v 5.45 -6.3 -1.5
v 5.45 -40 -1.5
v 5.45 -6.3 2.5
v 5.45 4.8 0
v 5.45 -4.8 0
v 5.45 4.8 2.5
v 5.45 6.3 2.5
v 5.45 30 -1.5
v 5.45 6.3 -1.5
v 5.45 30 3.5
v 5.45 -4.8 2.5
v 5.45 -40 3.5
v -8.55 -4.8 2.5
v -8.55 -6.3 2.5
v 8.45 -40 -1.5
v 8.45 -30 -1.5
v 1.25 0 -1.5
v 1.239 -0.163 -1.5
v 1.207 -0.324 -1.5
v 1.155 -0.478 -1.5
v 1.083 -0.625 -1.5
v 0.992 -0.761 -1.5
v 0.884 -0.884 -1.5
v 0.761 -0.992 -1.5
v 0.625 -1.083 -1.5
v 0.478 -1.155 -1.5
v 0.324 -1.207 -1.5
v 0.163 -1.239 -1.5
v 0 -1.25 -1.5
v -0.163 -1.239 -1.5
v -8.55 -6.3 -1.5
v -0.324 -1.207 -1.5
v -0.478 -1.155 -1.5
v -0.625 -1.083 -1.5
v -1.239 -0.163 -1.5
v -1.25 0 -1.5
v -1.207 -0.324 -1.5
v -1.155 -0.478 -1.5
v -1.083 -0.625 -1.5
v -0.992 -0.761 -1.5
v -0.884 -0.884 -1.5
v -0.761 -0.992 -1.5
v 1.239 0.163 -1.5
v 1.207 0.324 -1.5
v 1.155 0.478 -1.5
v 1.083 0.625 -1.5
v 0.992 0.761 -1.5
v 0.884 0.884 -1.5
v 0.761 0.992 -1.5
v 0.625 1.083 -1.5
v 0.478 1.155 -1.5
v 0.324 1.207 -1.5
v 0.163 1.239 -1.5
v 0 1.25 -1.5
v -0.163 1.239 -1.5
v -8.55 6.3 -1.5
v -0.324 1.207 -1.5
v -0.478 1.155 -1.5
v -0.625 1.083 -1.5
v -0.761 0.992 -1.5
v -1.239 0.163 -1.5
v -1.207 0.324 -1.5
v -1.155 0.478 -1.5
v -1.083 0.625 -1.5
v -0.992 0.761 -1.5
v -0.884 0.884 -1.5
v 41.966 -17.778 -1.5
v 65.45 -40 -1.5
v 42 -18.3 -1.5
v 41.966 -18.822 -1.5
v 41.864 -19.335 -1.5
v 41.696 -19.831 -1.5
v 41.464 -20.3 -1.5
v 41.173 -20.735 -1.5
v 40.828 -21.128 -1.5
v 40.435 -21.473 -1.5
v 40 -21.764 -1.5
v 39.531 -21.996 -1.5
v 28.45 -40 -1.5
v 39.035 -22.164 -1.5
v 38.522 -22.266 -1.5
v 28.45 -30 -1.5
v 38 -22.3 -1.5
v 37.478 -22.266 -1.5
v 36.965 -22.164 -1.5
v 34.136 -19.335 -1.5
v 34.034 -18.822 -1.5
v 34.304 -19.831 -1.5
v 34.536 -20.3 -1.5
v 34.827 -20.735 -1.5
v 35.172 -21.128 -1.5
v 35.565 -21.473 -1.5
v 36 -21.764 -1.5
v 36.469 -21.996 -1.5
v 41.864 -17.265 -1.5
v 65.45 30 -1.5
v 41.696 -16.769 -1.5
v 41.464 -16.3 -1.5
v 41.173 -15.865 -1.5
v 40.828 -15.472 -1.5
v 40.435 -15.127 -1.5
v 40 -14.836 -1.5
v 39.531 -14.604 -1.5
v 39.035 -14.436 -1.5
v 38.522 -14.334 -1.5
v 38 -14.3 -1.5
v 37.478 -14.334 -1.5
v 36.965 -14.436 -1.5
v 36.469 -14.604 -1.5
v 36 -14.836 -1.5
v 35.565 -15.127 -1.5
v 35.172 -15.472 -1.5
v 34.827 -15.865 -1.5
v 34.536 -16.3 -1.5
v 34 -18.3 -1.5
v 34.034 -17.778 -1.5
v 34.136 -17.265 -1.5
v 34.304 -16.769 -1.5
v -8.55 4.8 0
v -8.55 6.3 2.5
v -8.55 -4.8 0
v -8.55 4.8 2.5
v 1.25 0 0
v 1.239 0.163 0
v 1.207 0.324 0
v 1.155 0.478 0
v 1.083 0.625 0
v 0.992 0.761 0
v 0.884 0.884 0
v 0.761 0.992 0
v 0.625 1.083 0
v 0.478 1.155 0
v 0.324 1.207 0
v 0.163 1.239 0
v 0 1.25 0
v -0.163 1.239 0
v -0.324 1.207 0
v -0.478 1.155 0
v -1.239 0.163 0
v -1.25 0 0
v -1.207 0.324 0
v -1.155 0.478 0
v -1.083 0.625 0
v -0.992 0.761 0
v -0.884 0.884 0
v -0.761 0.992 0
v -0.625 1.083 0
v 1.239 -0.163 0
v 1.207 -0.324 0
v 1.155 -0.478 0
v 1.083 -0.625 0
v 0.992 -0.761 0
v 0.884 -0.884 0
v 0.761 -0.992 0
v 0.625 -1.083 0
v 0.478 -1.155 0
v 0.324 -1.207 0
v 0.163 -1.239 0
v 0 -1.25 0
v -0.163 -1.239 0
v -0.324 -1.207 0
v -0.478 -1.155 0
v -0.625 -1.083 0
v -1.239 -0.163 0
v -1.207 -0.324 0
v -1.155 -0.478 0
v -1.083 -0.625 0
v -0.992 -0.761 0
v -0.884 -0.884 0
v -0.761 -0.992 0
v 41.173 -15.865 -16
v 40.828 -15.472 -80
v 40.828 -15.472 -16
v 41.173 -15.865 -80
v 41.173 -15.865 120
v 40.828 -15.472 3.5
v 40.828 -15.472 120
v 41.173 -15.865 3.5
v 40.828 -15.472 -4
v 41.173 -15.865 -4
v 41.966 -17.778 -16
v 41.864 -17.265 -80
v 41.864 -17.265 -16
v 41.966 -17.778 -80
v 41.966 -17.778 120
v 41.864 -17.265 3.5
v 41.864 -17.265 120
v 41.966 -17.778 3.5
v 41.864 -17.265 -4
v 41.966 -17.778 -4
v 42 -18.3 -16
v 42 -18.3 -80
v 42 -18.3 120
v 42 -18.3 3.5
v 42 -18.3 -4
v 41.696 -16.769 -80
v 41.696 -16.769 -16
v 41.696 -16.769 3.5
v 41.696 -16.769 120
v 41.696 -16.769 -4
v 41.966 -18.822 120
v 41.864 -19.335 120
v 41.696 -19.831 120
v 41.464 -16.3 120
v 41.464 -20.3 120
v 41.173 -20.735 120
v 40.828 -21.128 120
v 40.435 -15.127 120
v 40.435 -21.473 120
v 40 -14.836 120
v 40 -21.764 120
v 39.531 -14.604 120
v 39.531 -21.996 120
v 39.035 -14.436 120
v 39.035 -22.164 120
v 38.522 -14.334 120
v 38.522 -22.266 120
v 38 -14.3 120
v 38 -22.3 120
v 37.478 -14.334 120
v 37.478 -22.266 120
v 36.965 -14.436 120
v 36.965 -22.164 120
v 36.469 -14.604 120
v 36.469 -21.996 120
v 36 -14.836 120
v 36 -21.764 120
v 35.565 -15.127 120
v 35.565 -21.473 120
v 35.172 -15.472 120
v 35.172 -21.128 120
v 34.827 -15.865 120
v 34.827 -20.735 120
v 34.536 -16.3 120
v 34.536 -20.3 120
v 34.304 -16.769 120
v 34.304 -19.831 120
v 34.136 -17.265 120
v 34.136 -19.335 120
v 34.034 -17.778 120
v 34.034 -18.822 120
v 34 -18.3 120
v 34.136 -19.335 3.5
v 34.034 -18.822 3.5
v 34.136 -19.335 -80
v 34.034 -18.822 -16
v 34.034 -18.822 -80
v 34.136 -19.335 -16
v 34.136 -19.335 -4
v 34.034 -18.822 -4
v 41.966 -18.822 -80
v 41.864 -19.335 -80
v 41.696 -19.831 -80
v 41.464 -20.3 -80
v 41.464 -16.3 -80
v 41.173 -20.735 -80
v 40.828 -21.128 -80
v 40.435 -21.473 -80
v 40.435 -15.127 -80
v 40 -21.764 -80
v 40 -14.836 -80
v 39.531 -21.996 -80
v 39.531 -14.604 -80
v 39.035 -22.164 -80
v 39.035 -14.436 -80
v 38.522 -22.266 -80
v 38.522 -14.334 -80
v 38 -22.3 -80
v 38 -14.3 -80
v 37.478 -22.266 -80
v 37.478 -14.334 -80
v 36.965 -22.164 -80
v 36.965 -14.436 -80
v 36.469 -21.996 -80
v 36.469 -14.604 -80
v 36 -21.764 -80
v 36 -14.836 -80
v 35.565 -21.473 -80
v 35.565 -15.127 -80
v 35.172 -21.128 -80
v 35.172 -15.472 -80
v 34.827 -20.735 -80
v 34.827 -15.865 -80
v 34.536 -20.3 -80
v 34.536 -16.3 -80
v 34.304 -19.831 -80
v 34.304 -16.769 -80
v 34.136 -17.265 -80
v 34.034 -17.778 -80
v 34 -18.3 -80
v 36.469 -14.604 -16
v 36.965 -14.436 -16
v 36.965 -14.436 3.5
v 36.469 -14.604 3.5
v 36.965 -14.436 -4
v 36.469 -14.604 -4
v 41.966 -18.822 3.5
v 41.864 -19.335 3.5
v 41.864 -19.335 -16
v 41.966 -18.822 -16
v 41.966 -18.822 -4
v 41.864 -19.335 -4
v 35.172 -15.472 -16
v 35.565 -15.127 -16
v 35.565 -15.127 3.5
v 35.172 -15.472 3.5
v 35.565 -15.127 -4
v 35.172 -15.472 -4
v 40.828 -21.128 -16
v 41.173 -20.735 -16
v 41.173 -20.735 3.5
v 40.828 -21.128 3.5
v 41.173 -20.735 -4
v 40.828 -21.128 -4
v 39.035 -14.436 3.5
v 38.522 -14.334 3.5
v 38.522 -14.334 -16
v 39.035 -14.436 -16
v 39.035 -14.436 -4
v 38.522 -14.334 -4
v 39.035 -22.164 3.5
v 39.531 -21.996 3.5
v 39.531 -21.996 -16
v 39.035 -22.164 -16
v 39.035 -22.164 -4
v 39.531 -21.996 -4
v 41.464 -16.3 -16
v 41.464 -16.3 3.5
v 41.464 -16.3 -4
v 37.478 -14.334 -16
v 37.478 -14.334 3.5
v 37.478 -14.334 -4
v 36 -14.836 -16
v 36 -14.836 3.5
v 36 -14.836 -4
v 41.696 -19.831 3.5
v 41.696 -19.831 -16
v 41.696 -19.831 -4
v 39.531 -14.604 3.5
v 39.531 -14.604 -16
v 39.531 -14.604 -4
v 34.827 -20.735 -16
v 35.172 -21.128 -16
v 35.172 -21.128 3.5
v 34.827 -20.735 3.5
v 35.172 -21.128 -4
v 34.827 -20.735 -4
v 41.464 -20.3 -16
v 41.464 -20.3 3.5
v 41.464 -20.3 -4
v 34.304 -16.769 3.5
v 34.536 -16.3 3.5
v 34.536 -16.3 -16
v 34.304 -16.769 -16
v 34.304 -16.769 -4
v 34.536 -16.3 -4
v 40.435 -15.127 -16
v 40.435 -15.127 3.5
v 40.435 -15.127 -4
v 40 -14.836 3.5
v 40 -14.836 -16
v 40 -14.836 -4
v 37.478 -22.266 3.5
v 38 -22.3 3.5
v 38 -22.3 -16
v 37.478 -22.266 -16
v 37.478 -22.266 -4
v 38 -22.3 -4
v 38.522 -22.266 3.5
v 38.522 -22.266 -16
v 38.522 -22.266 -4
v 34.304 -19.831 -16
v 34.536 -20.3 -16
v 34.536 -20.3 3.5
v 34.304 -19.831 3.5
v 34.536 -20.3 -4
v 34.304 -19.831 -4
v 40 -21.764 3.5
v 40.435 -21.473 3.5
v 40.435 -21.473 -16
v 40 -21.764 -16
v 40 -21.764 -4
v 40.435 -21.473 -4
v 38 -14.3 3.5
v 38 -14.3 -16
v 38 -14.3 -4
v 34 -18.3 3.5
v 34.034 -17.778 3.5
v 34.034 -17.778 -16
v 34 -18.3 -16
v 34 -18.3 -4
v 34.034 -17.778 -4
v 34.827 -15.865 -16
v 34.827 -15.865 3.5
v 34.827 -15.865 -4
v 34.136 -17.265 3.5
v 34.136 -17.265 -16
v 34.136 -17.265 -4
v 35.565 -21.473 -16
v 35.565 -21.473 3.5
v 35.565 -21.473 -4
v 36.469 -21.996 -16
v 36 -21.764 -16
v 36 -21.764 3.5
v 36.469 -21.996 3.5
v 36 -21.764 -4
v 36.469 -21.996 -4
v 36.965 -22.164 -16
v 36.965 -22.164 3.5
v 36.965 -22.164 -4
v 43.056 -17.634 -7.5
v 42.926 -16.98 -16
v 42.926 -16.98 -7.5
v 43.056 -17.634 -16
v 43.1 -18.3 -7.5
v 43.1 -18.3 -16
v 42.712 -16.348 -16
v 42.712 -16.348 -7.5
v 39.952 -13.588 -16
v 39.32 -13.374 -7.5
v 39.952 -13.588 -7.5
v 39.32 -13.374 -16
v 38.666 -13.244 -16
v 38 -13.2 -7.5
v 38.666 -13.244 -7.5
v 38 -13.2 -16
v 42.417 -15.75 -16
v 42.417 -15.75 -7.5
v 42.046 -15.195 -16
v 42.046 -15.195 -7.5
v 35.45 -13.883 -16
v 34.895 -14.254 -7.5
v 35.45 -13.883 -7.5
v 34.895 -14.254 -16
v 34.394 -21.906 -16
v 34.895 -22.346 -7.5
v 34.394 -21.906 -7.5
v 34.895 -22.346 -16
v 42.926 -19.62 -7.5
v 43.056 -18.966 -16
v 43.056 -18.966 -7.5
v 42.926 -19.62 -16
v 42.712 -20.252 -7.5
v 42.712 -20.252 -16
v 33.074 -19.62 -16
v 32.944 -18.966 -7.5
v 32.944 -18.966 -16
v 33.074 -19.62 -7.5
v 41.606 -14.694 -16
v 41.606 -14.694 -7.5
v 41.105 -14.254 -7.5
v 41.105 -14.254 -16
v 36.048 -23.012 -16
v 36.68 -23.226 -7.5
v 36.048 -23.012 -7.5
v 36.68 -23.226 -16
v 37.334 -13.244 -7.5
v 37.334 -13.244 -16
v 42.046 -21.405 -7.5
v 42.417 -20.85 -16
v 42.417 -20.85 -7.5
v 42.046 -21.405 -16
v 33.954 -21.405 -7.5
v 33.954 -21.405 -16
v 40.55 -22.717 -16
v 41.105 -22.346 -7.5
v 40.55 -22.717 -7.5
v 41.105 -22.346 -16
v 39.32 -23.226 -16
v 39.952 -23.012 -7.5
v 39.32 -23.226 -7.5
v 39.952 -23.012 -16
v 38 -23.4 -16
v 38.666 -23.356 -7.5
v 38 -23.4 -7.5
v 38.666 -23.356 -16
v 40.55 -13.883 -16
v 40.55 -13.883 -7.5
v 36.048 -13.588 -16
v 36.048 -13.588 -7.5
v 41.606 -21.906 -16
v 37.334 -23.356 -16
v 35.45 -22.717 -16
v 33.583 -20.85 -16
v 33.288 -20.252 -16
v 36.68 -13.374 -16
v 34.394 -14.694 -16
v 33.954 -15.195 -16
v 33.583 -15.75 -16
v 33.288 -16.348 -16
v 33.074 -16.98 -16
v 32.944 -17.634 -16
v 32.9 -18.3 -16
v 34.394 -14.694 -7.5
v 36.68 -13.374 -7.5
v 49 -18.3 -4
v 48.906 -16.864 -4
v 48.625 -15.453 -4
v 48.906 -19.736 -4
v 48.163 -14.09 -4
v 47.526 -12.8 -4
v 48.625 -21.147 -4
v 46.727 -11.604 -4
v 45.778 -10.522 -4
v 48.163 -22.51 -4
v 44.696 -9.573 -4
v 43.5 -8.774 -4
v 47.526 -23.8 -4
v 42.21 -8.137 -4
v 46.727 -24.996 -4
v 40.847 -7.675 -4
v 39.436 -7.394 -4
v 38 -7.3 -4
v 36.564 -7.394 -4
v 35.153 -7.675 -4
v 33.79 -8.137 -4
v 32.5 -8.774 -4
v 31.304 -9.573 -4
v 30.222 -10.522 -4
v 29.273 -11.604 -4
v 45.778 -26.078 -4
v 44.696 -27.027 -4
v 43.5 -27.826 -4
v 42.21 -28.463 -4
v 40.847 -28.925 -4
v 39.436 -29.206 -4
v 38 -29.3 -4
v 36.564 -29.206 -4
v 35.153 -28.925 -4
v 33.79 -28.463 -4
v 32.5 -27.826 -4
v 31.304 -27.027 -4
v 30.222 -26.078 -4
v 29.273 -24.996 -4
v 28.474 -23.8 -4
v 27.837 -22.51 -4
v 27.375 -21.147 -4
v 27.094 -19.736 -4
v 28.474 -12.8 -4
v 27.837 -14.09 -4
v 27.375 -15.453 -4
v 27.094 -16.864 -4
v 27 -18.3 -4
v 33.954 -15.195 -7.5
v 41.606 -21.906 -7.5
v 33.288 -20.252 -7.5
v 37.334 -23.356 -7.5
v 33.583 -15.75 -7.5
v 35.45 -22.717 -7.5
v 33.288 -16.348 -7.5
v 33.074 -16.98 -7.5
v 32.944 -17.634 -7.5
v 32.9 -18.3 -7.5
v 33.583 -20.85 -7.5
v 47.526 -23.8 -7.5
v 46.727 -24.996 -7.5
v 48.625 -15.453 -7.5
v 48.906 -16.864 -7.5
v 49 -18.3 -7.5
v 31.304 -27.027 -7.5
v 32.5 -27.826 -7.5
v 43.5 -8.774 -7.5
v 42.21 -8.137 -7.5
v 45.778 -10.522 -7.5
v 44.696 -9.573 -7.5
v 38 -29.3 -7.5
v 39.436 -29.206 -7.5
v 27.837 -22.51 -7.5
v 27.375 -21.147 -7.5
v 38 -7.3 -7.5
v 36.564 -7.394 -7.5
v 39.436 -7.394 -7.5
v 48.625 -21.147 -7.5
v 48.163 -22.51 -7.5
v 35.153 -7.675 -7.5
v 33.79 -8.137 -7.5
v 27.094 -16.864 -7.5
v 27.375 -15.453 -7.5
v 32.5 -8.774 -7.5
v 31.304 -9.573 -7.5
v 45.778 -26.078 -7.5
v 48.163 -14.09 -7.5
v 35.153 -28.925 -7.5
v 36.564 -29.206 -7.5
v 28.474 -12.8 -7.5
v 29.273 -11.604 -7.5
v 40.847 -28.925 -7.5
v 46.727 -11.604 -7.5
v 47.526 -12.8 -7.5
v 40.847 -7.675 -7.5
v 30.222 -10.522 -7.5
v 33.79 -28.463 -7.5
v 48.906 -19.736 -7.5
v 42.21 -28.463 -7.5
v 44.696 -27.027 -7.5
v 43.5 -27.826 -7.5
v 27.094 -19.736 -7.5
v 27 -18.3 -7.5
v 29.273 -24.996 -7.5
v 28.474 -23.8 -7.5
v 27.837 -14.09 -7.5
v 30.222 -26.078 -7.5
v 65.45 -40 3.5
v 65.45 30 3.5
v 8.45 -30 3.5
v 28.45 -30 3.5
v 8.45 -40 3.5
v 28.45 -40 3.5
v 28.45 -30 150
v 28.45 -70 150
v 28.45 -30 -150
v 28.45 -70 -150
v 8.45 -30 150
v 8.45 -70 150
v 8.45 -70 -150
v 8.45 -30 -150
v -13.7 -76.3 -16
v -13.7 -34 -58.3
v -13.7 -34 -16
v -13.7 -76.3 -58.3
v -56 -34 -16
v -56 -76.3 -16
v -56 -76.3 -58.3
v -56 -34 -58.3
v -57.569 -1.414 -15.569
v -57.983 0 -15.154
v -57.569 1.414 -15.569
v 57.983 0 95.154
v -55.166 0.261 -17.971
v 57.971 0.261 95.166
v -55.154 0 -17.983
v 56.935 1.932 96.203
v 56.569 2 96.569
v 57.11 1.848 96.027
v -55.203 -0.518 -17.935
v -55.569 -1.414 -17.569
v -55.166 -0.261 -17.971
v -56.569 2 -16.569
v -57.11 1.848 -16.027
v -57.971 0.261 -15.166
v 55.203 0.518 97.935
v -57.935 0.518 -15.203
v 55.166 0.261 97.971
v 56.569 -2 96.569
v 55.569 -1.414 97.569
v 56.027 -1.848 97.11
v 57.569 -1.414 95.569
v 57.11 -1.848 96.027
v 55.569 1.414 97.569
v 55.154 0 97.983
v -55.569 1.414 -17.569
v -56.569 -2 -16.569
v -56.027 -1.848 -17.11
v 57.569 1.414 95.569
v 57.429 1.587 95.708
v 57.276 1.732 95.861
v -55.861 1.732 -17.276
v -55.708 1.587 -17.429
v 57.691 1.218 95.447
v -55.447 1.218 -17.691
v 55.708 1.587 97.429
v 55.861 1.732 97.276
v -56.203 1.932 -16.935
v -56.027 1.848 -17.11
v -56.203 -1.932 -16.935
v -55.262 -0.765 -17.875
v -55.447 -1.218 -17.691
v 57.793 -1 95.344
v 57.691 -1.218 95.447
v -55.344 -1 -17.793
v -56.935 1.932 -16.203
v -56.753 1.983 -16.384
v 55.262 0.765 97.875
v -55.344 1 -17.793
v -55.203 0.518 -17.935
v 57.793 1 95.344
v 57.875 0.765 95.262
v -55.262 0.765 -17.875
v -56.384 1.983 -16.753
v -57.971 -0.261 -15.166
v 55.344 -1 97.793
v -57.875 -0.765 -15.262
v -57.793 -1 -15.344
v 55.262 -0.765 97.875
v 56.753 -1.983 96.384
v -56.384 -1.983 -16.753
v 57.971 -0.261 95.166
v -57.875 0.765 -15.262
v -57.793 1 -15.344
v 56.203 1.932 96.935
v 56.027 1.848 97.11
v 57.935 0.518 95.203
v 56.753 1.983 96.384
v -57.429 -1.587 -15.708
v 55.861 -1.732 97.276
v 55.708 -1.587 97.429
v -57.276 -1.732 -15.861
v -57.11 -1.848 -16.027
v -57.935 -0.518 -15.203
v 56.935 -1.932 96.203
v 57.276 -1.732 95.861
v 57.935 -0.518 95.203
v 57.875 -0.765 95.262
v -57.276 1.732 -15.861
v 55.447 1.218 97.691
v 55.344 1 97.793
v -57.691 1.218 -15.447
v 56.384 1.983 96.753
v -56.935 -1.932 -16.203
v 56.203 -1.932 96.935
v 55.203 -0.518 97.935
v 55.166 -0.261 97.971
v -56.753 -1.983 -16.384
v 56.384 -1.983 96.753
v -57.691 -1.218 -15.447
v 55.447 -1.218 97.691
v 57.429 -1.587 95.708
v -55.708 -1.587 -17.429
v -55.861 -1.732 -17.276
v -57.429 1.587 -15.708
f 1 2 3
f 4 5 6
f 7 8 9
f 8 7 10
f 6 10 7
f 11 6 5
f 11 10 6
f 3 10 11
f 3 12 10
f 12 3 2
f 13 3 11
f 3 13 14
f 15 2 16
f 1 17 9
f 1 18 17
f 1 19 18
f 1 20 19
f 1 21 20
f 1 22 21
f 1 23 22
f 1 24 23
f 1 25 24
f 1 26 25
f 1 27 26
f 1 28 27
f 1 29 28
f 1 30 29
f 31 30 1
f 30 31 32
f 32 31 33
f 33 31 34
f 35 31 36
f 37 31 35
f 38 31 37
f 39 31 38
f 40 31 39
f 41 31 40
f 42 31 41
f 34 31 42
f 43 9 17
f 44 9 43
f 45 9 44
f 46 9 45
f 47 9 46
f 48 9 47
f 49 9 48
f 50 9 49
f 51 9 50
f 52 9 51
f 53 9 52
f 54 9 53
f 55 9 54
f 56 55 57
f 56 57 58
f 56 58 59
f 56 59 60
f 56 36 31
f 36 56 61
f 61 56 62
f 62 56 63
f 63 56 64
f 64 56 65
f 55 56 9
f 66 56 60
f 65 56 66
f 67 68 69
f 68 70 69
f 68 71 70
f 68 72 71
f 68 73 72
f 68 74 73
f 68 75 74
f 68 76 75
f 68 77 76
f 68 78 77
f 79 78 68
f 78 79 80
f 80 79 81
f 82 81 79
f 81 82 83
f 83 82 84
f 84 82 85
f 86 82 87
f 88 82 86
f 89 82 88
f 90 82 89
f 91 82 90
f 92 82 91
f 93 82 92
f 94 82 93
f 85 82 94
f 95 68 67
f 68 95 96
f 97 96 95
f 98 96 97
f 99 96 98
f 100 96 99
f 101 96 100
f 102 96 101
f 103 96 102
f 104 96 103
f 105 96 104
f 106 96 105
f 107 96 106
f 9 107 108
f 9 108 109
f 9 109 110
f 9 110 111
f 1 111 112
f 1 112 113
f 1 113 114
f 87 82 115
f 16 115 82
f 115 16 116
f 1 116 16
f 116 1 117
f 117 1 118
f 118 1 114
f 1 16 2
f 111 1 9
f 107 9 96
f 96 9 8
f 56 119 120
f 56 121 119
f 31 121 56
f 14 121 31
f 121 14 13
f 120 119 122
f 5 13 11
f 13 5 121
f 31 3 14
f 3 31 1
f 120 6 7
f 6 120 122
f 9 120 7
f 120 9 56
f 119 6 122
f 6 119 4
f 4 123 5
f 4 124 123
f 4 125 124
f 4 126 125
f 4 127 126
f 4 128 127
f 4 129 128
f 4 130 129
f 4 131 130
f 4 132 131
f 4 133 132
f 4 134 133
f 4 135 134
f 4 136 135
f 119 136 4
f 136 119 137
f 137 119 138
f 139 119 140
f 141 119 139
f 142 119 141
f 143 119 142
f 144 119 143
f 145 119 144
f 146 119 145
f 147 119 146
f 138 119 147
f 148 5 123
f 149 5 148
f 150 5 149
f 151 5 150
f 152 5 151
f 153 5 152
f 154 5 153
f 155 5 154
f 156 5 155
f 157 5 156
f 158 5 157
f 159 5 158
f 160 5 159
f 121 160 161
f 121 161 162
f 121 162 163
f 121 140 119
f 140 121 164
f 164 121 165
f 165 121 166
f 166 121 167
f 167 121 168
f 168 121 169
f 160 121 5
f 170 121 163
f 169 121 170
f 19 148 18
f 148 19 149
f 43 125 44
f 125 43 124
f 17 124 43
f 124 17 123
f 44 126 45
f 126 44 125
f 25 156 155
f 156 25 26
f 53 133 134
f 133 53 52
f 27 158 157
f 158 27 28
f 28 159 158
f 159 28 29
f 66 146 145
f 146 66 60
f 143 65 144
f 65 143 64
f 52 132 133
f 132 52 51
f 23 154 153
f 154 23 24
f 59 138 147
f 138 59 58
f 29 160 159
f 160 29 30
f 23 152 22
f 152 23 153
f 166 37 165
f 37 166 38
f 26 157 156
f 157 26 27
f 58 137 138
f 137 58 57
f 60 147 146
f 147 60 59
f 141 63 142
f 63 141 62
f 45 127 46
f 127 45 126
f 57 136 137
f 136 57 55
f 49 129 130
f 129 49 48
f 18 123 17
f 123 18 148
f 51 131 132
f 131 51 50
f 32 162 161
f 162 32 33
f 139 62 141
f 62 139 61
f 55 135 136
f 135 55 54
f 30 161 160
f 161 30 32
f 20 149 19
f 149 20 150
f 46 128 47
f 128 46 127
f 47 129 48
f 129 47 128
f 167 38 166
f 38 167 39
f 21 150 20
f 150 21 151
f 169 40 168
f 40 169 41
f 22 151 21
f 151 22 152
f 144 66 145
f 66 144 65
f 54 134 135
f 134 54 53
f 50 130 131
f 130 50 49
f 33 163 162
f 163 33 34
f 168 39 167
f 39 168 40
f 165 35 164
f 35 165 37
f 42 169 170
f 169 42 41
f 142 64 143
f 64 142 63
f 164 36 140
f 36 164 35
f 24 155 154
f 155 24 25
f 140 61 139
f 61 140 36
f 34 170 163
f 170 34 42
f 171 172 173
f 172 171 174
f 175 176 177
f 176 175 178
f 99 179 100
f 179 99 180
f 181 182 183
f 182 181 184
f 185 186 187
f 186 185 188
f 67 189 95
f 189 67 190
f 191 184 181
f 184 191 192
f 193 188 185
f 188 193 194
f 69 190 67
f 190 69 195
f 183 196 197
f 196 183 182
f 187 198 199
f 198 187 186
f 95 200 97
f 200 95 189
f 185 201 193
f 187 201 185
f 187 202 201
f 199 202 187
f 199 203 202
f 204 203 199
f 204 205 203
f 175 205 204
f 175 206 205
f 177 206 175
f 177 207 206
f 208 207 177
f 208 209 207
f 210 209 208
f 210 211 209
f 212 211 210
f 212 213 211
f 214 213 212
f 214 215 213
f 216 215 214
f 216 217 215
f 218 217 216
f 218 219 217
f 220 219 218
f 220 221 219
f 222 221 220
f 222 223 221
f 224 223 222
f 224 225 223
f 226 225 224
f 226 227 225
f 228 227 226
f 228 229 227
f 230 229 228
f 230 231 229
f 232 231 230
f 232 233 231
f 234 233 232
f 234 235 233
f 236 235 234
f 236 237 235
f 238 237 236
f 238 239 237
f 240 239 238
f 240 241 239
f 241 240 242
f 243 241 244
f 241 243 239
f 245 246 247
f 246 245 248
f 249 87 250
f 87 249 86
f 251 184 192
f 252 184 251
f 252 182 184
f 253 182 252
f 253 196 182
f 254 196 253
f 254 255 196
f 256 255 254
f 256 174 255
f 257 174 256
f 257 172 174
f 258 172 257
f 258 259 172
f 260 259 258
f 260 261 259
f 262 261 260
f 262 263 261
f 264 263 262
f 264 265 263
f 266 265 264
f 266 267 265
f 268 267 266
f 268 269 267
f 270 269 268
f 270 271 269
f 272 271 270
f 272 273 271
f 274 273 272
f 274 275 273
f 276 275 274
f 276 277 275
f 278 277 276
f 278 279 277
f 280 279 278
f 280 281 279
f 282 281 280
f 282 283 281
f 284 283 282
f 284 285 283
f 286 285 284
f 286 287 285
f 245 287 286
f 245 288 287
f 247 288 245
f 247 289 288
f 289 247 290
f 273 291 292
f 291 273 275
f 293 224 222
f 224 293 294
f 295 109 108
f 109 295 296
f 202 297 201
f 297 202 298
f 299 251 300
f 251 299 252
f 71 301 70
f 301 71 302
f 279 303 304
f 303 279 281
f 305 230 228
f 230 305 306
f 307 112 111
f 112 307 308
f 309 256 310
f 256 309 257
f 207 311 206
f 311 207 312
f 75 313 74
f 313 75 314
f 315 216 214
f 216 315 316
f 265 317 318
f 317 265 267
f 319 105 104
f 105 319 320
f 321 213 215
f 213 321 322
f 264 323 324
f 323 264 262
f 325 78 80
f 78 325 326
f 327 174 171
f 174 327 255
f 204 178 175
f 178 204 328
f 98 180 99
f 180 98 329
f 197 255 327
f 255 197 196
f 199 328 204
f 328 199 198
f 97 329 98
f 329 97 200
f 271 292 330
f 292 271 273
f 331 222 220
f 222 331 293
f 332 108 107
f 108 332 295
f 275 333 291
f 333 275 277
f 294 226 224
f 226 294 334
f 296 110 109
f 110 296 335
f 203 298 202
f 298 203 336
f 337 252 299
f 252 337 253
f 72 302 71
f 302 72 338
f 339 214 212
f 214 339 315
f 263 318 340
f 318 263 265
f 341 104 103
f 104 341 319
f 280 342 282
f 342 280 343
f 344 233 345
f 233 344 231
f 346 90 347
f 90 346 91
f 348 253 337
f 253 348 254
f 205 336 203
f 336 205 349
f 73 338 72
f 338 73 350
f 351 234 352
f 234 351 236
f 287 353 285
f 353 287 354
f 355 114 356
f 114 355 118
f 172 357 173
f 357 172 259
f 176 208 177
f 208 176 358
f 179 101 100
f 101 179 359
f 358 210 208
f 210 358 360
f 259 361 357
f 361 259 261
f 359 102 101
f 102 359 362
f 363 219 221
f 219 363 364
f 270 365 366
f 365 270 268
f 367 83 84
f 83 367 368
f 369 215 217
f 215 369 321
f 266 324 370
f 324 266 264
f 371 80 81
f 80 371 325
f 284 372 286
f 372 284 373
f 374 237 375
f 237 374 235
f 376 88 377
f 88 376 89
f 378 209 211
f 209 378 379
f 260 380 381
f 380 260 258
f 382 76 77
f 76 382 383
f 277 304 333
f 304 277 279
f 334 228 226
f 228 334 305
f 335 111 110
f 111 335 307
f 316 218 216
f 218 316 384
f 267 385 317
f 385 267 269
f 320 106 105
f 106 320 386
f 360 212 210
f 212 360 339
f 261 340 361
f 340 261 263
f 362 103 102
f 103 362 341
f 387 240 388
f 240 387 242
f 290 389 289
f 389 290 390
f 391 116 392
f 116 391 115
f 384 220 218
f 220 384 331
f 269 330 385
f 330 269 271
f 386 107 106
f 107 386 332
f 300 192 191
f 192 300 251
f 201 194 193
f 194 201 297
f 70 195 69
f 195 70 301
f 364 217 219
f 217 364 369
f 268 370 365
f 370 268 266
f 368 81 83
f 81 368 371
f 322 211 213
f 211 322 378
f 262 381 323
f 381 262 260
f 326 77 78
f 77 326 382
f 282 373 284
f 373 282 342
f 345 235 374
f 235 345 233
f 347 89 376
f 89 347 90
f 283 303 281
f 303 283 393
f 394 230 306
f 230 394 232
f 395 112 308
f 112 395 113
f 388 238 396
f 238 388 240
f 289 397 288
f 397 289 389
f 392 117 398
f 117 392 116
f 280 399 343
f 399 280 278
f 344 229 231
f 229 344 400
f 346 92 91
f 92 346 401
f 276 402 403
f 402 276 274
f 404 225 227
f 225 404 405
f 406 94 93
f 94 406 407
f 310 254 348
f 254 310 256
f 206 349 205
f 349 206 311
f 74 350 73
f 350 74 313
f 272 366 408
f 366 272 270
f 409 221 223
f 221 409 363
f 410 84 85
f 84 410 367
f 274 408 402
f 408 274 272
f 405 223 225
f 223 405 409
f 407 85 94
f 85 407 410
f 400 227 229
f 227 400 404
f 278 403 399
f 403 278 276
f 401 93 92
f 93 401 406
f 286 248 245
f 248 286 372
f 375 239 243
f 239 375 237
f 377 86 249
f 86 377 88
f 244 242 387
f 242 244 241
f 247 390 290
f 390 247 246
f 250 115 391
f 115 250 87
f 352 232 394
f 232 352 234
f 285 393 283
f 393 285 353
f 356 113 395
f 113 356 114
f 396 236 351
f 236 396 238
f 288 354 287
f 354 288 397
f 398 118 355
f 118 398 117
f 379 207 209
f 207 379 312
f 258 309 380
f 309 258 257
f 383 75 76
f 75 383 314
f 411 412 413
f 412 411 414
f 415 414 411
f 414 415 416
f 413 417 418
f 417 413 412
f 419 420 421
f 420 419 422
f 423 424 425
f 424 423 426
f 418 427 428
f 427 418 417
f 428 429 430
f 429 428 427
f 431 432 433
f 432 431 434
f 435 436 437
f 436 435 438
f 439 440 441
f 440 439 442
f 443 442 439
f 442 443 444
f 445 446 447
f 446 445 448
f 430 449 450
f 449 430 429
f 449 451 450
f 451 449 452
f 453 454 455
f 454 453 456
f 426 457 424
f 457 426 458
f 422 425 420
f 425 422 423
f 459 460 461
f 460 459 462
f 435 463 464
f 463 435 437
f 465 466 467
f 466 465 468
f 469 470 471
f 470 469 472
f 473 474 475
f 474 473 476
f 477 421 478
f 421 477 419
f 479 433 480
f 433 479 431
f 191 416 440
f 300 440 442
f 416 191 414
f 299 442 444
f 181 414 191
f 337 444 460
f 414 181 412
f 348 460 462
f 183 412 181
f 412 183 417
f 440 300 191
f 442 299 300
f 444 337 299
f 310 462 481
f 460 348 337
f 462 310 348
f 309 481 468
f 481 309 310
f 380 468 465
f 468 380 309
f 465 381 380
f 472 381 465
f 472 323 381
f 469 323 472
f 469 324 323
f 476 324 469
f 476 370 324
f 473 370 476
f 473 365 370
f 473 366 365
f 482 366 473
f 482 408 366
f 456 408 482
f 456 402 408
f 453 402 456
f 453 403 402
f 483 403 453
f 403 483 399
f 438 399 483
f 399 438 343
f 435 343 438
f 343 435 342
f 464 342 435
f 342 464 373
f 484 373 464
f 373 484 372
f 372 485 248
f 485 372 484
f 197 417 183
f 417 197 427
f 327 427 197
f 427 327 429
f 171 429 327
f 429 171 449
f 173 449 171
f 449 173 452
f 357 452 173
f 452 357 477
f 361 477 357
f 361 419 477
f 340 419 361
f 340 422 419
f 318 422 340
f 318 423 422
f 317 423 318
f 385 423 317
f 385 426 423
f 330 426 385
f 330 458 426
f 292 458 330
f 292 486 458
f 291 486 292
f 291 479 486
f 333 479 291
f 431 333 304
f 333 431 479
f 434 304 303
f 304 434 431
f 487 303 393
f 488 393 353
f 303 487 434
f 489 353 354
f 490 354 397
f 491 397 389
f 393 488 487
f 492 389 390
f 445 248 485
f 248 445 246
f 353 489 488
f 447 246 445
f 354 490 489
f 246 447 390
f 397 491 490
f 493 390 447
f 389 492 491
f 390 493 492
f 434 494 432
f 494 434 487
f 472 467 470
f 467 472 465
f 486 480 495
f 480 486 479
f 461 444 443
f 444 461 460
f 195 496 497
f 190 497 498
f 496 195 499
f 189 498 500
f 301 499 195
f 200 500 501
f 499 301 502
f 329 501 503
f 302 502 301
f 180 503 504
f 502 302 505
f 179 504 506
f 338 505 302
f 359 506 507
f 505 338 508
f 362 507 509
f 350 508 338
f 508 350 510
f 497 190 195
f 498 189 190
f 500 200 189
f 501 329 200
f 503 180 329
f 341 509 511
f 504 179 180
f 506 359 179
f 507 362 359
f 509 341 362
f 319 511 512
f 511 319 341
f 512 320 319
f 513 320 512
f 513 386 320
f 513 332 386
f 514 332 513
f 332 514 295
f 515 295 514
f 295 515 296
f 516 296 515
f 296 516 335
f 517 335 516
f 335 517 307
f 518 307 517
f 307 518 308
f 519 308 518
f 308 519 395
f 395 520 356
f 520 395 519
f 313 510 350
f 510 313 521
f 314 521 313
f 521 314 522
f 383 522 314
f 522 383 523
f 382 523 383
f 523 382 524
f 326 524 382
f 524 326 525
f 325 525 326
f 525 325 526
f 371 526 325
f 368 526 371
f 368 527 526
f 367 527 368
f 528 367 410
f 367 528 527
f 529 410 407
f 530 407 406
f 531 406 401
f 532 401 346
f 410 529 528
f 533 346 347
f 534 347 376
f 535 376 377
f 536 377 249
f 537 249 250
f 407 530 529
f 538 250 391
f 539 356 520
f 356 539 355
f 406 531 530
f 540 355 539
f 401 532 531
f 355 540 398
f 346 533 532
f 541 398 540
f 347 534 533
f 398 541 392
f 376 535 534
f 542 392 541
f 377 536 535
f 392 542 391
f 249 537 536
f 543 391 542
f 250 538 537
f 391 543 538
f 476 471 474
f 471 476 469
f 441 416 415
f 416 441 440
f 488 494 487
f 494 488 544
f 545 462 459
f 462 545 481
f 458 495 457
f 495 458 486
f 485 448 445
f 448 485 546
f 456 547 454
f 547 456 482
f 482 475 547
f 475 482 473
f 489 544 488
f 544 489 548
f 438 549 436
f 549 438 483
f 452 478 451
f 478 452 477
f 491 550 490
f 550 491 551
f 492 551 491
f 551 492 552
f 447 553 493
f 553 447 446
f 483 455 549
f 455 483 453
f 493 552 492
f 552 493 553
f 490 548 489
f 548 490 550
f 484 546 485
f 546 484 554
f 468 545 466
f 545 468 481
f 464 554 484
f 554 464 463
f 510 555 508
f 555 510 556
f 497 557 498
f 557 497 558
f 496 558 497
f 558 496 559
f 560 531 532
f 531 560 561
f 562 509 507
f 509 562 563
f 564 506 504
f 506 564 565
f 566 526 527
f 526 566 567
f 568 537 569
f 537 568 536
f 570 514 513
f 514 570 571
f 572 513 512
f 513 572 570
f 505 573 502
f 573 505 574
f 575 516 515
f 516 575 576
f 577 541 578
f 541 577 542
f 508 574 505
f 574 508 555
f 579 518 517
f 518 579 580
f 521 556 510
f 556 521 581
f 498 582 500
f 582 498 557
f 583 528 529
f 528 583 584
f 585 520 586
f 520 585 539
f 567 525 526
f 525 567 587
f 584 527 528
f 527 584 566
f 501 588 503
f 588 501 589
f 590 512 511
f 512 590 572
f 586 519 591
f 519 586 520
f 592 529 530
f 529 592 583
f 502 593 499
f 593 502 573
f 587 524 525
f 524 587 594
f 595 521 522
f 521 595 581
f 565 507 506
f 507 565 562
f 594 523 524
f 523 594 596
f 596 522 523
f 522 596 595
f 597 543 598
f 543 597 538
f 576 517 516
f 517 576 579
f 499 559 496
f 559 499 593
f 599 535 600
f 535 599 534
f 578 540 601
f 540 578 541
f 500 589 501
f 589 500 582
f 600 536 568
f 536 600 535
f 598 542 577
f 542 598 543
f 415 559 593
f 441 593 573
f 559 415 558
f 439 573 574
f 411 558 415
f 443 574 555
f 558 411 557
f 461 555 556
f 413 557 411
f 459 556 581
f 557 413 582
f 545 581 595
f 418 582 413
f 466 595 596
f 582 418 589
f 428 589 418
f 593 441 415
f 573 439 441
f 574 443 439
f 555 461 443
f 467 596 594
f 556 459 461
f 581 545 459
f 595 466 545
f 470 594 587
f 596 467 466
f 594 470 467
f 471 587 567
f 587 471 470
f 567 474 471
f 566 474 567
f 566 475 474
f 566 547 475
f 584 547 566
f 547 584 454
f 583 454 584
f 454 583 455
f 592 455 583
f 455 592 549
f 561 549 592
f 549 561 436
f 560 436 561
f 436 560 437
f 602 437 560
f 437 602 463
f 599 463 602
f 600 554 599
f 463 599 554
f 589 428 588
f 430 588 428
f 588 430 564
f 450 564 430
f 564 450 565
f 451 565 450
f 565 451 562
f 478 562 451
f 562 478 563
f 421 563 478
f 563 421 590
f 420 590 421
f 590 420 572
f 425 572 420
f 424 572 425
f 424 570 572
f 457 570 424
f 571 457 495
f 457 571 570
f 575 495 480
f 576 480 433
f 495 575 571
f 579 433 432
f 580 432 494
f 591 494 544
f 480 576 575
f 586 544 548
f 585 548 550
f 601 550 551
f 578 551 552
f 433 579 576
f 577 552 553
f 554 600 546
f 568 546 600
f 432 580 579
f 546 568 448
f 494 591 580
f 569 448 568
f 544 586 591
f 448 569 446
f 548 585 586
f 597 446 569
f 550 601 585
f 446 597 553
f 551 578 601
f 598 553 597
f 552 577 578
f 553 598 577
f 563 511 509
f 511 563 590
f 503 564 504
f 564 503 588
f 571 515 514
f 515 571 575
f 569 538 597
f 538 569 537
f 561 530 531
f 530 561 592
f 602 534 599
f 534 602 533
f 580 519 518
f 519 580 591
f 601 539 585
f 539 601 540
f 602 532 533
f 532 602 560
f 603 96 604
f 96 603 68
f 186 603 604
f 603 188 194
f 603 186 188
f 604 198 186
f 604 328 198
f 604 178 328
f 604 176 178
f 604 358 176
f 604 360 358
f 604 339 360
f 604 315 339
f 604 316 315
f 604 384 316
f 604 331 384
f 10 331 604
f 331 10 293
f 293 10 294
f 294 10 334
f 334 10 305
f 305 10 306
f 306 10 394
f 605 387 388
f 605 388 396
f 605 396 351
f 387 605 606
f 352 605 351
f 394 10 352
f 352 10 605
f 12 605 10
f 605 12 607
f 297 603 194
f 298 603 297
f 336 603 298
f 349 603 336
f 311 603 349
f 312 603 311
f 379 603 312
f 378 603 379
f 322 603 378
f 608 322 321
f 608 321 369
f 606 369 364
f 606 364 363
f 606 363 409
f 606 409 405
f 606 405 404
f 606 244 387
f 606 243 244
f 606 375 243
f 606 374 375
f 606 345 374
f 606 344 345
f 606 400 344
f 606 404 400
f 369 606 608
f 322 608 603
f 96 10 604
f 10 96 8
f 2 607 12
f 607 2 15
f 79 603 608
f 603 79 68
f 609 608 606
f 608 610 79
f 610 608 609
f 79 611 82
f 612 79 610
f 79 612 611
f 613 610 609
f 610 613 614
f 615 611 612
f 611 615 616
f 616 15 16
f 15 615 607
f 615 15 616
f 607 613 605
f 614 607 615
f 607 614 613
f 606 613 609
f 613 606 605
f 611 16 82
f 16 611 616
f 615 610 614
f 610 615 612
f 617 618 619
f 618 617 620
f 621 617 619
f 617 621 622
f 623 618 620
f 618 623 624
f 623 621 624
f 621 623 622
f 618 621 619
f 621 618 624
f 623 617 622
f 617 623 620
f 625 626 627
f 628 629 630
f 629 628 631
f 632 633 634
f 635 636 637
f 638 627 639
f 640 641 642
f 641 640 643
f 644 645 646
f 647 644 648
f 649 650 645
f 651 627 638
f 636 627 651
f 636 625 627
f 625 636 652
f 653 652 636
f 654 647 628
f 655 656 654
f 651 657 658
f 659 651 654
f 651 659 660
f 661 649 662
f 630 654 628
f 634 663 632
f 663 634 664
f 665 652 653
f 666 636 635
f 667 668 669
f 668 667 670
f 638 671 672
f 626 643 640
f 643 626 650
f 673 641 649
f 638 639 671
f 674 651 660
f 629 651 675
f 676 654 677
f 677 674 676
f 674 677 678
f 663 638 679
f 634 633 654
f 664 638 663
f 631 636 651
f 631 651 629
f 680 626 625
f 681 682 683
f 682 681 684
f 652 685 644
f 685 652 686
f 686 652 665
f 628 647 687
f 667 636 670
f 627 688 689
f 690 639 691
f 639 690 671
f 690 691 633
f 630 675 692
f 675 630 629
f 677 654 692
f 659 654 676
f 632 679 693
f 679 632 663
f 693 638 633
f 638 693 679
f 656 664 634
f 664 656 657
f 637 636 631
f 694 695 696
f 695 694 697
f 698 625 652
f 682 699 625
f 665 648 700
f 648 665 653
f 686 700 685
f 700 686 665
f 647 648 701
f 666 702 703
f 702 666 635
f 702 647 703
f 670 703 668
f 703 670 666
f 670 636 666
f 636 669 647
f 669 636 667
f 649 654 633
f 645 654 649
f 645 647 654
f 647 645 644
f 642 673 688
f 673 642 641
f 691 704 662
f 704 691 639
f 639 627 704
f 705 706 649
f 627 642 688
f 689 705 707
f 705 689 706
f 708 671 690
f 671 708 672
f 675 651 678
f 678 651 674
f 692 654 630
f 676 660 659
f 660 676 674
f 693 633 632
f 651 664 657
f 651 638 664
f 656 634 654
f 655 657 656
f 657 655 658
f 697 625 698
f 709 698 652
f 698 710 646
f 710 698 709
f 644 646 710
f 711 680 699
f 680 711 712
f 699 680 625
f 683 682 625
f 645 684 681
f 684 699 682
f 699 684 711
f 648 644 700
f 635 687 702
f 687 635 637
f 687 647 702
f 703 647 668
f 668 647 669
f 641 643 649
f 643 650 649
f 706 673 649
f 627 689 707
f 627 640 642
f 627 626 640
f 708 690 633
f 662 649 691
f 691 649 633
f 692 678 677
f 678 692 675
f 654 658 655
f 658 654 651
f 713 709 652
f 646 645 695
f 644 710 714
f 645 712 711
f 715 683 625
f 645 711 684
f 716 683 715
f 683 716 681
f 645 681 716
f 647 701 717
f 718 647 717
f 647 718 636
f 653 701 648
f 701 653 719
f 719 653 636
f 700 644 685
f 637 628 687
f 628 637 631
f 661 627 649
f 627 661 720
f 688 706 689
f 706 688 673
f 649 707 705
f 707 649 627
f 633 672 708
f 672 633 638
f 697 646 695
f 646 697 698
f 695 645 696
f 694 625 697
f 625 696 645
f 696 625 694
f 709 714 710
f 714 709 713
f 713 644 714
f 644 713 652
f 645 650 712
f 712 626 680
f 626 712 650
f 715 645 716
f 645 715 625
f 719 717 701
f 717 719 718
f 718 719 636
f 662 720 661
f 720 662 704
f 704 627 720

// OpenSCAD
// kobra_xmotor_env.scad
// Reference model of the space around the Kobra Max X motor / left Z carriage,
// where the AFC bowden passes on its way to the toolhead. This is the GROUND
// TRUTH the tube guide is designed around.
//
// Axes (printer X/Y, world Z):
//   X = printer X. +X is toward the bed (inboard); -X is outboard, toward the
//       BoxTurtle.
//   Y = front/back. -Y is the printer front.
//   Z = up.
//   Origin = centre of the tapped M3 hole, on the top face of the old runout-
//            sensor tab (stock Kobra Z carriage). Everything rides with the
//            carriage EXCEPT the leadscrew, which is fixed to the frame.
//
// Preview:  openscad -o env_iso.png --render --imgsize=1200,900 \
//             --colorscheme=Tomorrow --camera=0,0,10,60,0,215,330 kobra_xmotor_env.scad

$fn = 48;

/* ---------- Measured / stated (2026-10-17) ---------- */
tab_in_w      = 9.6;   // clear width between the two raised walls (Y)
wall_h        = 2.5;   // raised side walls, above the tab's top face
hole_edge_to_end = 7.3; // M3 hole edge -> free (outboard) end of the tab
wall_to_screw = 8;     // front tab wall -> Z leadscrew surface, in Y
screw_d       = 8;     // Z leadscrew
rise          = 40;    // wanted tube height above the tab (clear of the wire tangle)
tube_od       = 4;     // one continuous PTFE run, turtleneck -> toolhead
tube_id       = 2.5;   // 2.5 or 2 depending on stock
// Tab sticks straight out (-X) from the carriage, walls on its front/back
// edges, hole centred between them. Tube comes up from below (BoxTurtle,
// outboard + low), rises past here, loops high, and drops into the toolhead.

tab_len       = 14;    // length of the raised walls = free end -> gantry base plate (X)
screw_dx      = 38;    // leadscrew centre X relative to the hole (+ = inboard)
// Tube rises inboard: BoxTurtle (low, outboard) -> past the carriage -> loops
// above the gantry and toolhead -> down into the toolhead top. Its angle here
// changes with X: flatter with the toolhead far +X, steeper far -X.
tube_angle    = 45;    // nominal; the guide's clamp pivots to follow it
// Above the gantry base plate there's only a loose wire mass, nothing solid.
// The guide must not stick out past the X motor's outboard face (gets bumped).

/* ---------- ASSUMED from photos (CONFIRM) ---------- */
tap_d      = 2.5;  // tapped M3 hole
tab_wall_t = 1.5;  // wall thickness (sheet steel)
sheet_t    = 1.5;  // tab sheet thickness = M3 thread length available
plate_t    = 5;    // gantry base plate the tab is part of: top is ~level with the tab
nut_d      = 22;   // brass nut flange (moves with the carriage)
nut_top_z  = -4;   // top of the brass nut flange vs the tab top
upright_y1 = -30;  // back face of the 2040 Z upright (it's in front of the leadscrew)
// X motor (NEMA17, 42.3 square) sits further forward, below and outboard.
motor_top_z = -16;
motor_x0    = -56;  // motor's OUTBOARD face = the guide's -X limit
motor_y1    = -34; // motor's back face

/* ---------- Derived ---------- */
hole_from_end = hole_edge_to_end + tap_d / 2;   // 8.55
tab_out_w = tab_in_w + 2 * tab_wall_t;
tab_x0    = -hole_from_end;                     // free (outboard) end
tab_x1    = tab_x0 + tab_len;                   // gantry base plate edge
screw_y   = -(tab_out_w / 2 + wall_to_screw + screw_d / 2);

module tab() {
    // Bent sheet tongue with up-turned edges; the M3 hole is tapped.
    color("DimGray") difference() {
        union() {
            translate([tab_x0, -tab_out_w / 2, -sheet_t]) cube([tab_len, tab_out_w, sheet_t]);
            for (s = [-1, 1])
                translate([tab_x0, s * (tab_in_w / 2 + tab_wall_t / 2) - tab_wall_t / 2, -sheet_t])
                    cube([tab_len, tab_wall_t, sheet_t + wall_h]);
        }
        translate([0, 0, -5]) cylinder(d = tap_d, h = 10);
    }
}

module gantry_plate() {
    // Gantry base plate the tab sticks out of; only loose wires above it.
    color("Black", 0.8) translate([tab_x1, -40, -sheet_t]) cube([60, 70, plate_t]);
    %translate([tab_x1, -40, plate_t]) cube([60, 70, 50]);   // wire mass (soft)
}

module leadscrew() {
    // Fixed to the frame: present at EVERY height, so the guide can't reach over it.
    color("Silver") translate([screw_dx, screw_y, -80]) cylinder(d = screw_d, h = 200);
    color("Goldenrod") translate([screw_dx, screw_y, nut_top_z - 12]) cylinder(d = 10.2, h = 12);
    color("Goldenrod") translate([screw_dx, screw_y, nut_top_z - 3.5]) cylinder(d = nut_d, h = 3.5);
}

module upright() {
    color("DarkSlateGray", 0.6) translate([tab_x1 + 3, upright_y1 - 40, -150]) cube([20, 40, 300]);
}

module x_motor() {
    color("SteelBlue", 0.6)
        translate([motor_x0, motor_y1 - 42.3, motor_top_z - 42.3]) cube([42.3, 42.3, 42.3]);
}

module tube_path(p = [0, 0, rise], len = 160) {
    // Target run: a straight 45-deg line through the guide point p, rising
    // inboard. Below, it bends away to the BoxTurtle; above, into the loop.
    color("Red") translate(p) rotate([0, 90 - tube_angle, 0])
        translate([0, 0, -len / 2]) cylinder(d = tube_od, h = len);
}

module env() {
    tab();
    gantry_plate();
    leadscrew();
    upright();
    x_motor();
}

// Files that `include` this one set env_standalone = false to skip this scene.
env_standalone = true;
if (env_standalone) {
    env();
    tube_path();
}
